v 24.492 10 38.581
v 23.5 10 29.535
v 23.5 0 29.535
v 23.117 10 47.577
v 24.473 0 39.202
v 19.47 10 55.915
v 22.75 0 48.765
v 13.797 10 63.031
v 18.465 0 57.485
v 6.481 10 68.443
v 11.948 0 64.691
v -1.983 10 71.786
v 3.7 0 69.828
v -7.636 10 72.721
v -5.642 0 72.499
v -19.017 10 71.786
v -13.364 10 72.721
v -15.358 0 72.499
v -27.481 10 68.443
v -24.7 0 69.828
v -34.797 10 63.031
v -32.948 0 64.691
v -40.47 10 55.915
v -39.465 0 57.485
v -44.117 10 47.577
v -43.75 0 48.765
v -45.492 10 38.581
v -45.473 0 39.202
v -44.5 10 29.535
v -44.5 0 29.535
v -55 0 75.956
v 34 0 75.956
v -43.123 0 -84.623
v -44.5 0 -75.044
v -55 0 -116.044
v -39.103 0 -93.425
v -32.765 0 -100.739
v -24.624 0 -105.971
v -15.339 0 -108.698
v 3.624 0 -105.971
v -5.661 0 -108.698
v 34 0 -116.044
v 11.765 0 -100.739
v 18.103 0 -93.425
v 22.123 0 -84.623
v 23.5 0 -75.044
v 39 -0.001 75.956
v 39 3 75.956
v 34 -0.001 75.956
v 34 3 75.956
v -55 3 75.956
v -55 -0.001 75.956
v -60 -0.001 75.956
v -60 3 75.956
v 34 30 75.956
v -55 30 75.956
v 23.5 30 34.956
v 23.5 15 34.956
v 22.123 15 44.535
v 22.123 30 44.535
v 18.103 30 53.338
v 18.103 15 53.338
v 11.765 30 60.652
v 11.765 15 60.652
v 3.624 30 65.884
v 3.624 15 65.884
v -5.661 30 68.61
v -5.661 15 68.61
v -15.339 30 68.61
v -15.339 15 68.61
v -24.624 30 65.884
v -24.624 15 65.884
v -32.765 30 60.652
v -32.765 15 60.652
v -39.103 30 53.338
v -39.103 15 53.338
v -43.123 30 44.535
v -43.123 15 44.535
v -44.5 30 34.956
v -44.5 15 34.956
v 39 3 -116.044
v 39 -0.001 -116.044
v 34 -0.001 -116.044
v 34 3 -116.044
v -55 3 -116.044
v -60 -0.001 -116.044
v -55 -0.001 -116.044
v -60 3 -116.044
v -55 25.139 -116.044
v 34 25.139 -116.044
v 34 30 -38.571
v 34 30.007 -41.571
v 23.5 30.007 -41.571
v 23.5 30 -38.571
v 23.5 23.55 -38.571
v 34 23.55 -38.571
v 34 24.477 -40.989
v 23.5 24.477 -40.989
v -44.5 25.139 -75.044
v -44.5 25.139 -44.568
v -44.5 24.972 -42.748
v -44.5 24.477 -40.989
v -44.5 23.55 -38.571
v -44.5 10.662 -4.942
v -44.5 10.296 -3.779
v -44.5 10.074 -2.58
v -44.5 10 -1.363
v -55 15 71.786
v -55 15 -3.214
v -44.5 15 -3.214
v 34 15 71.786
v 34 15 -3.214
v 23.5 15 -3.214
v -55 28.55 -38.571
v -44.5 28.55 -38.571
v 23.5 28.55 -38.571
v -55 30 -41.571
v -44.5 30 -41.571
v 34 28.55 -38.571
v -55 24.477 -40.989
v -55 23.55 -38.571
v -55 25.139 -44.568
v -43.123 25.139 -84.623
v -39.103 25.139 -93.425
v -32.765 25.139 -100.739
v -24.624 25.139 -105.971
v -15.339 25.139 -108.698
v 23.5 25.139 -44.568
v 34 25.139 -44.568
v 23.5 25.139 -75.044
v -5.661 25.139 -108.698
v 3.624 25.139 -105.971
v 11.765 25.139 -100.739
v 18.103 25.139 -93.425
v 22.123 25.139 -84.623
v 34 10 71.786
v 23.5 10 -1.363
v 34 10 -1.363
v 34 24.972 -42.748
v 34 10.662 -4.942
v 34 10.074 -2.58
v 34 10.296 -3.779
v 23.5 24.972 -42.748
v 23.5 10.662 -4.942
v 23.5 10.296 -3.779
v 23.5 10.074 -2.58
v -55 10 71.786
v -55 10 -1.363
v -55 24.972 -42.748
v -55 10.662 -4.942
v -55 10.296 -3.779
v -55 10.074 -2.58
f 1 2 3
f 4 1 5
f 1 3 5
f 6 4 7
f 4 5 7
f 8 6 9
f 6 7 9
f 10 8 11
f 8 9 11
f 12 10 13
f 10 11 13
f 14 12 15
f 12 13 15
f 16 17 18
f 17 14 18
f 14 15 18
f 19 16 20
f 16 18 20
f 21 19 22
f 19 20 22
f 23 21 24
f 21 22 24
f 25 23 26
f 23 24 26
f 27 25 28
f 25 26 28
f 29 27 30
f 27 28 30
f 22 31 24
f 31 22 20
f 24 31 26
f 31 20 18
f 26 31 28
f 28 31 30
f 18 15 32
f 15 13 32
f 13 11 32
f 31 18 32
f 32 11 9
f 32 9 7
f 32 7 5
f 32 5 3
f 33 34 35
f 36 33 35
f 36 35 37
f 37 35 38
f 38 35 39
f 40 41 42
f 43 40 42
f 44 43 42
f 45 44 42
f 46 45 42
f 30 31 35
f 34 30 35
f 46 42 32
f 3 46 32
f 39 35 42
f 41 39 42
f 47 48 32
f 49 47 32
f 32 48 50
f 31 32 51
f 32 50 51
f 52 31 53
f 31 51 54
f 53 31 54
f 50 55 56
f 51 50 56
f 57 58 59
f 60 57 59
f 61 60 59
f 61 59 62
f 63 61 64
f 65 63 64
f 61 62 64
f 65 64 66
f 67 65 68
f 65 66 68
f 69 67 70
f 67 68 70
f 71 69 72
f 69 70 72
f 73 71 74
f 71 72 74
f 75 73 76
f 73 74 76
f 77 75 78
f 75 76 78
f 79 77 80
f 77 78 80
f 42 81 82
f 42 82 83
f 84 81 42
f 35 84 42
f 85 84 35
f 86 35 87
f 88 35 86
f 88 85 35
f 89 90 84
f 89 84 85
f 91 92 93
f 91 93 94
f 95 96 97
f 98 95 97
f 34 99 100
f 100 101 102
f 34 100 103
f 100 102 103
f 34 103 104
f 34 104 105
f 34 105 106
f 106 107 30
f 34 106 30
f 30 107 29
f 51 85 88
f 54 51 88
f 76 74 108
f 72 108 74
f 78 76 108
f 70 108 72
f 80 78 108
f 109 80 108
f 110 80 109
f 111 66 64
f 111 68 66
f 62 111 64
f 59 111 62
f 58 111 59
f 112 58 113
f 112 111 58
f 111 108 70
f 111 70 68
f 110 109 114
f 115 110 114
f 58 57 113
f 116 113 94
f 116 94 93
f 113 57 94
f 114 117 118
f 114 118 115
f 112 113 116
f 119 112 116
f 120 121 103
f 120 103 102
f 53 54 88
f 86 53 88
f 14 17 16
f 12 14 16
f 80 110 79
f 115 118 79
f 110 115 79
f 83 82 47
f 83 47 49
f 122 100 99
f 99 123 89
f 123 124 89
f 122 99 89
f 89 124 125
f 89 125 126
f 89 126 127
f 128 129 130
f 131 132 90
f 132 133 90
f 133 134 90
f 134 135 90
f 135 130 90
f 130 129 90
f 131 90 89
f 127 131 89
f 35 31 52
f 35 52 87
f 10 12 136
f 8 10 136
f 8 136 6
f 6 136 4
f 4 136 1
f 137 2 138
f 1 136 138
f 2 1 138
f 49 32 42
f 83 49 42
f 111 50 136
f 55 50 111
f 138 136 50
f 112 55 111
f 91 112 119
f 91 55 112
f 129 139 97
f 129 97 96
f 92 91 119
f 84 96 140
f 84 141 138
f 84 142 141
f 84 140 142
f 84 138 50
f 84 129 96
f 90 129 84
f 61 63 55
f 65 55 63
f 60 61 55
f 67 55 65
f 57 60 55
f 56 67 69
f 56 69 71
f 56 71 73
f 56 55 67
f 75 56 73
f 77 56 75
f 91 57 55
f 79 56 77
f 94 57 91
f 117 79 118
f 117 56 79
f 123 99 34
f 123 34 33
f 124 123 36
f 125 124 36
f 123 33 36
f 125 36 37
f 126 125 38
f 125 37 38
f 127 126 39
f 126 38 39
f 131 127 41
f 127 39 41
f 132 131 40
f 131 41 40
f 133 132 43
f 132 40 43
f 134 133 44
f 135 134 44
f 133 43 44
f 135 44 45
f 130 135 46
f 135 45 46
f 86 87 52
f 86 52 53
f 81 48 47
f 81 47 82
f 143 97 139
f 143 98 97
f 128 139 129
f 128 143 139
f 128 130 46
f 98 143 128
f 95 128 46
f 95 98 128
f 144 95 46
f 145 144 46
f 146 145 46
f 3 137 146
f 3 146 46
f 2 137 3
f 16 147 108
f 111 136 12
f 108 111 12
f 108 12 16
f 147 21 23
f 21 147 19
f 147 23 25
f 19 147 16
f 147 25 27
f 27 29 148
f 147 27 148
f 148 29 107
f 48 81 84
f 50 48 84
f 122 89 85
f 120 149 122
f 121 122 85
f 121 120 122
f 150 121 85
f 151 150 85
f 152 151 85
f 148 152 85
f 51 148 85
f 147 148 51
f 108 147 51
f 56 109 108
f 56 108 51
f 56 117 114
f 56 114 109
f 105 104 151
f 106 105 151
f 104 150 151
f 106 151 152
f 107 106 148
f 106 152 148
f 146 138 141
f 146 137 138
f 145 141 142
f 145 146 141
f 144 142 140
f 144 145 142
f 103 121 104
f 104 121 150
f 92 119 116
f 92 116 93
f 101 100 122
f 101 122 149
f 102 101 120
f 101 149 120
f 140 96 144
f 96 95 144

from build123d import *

# Parameters (mm, degrees)
SKETCH1_W                = 89
SKETCH1_H                = 192
BOSS_EXTRUDE1_DEPTH      = 30
SKETCH2_R                = 34.99943994
CUT_EXTRUDE1_DEPTH       = 10
SKETCH3_W                = 75
SKETCH3_H                = 5
CUT_EXTRUDE2_DEPTH       = 102
CUT_EXTRUDE4_DEPTH       = 102
SKETCH6_W                = 10.5
SKETCH6_H                = 4
CUT_EXTRUDE7_DEPTH       = 8
BOSS_EXTRUDE2_DEPTH      = 10.5
CUT_EXTRUDE8_DEPTH       = 20.767757578
BOSS_EXTRUDE3_DEPTH      = 10.5
CUT_EXTRUDE9_DEPTH       = 22.812544275
BOSS_EXTRUDE6_DEPTH      = 10.5
BOSS_EXTRUDE7_DEPTH      = 10.5
FILLET1_R                = 10
FILLET2_R                = 10
FILLET3_R                = 10
FILLET4_R                = 10
CUT_EXTRUDE11_DEPTH      = 99
SKETCH15_W               = 7.554212703
SKETCH15_H               = 3.259234926
CUT_EXTRUDE12_DEPTH      = 99
FILLET5_R                = 10
BOSS_EXTRUDE8_DEPTH      = 0.001
BOSS_EXTRUDE8_DEPTH_BACK = 3
SKETCH16_W               = 5
SKETCH16_H               = 192


with BuildPart() as part:
    # Sketch1 → Boss-Extrude1 (new body)
    with BuildSketch(Plane(origin=(0, 0, 0), x_dir=(1, 0, 0), z_dir=(0, 1, 0))):
        with Locations((-10.5, 20.043668932)):
            Rectangle(SKETCH1_W, SKETCH1_H)
        with BuildLine():
            Line((-44.5, -34.956331068), (-44.5, 75.043668932))
            ThreePointArc((-44.5, 75.043668932), (-10.5, 109.043668932), (23.5, 75.043668932))
            Line((23.5, 75.043668932), (23.5, -34.956331068))
            ThreePointArc((23.5, -34.956331068), (-10.5, -68.956331068), (-44.5, -34.956331068))
        make_face(mode=Mode.SUBTRACT)
    extrude(amount=BOSS_EXTRUDE1_DEPTH)

    # Sketch2 → Cut-Extrude1 (cut)
    with BuildSketch(Plane.XZ):
        with Locations((-10.5, 37.838844027)):
            Circle(SKETCH2_R)
    extrude(amount=-CUT_EXTRUDE1_DEPTH, mode=Mode.SUBTRACT)

    # Sketch3 → Cut-Extrude2 (cut)
    with BuildSketch(Plane(origin=(34, 0, 0), x_dir=(0, 0, -1), z_dir=(1, 0, 0))):
        with Locations((-34.286288065, 12.5)):
            Rectangle(SKETCH3_W, SKETCH3_H)
    extrude(amount=-CUT_EXTRUDE2_DEPTH, mode=Mode.SUBTRACT)

    # Sketch4 → Cut-Extrude4 (cut)
    with BuildSketch(Plane.ZY.offset(55)):
        Polygon((-40.970715348, 29.469395922), (-41.211628541, 24.561719678), (-3.213711935, 10), (-3.213711935, 15), align=None)
    extrude(amount=-CUT_EXTRUDE4_DEPTH, mode=Mode.SUBTRACT)

    # Sketch6 → Cut-Extrude7 (cut)
    with BuildSketch(Plane(origin=(0, 30, 0), x_dir=(1, 0, 0), z_dir=(0, 1, 0))):
        with Locations((-49.75, 40.570603007)):
            Rectangle(SKETCH6_W, SKETCH6_H)
        with Locations((28.75, 40.570603007)):
            Rectangle(SKETCH6_W, SKETCH6_H)
    extrude(amount=-CUT_EXTRUDE7_DEPTH, mode=Mode.SUBTRACT)

    # Sketch7 → Boss-Extrude2 (add)
    with BuildSketch(Plane.ZY.offset(55)):
        Polygon((-38.570603007, 23.549614886), (-42.570603007, 25.082511526), (-42.570603007, 22), (-38.570603007, 22), align=None)
    extrude(amount=-BOSS_EXTRUDE2_DEPTH)

    # Sketch8 → Cut-Extrude8 (cut)
    with BuildSketch(Plane.ZY.offset(55)):
        Polygon((-42.570603007, 25.082511526), (-55.402488324, 30), (-42.570603007, 30), align=None)
    extrude(amount=-CUT_EXTRUDE8_DEPTH, mode=Mode.SUBTRACT)

    # Sketch9 → Boss-Extrude3 (add)
    with BuildSketch(Plane(origin=(34, 0, 0), x_dir=(0, 0, -1), z_dir=(1, 0, 0))):
        Polygon((38.570603007, 23.549614886), (42.570603007, 25.082511526), (42.570603007, 22), (38.570603007, 22), align=None)
    extrude(amount=-BOSS_EXTRUDE3_DEPTH)

    # Sketch10 → Cut-Extrude9 (cut)
    with BuildSketch(Plane(origin=(34, 0, 0), x_dir=(0, 0, -1), z_dir=(1, 0, 0))):
        Polygon((42.570603007, 25.082511526), (55.402488324, 30), (42.570603007, 30), align=None)
    extrude(amount=-CUT_EXTRUDE9_DEPTH, mode=Mode.SUBTRACT)

    # Sketch12 → Boss-Extrude6 (add)
    with BuildSketch(Plane.ZY.offset(55)):
        Polygon((-38.570603007, 30), (-41.570603007, 30), (-38.570603007, 28.549614886), align=None)
    extrude(amount=-BOSS_EXTRUDE6_DEPTH)

    # Sketch11 → Boss-Extrude7 (add)
    with BuildSketch(Plane(origin=(34, 0, 0), x_dir=(0, 0, -1), z_dir=(1, 0, 0))):
        Polygon((38.570603007, 28.549614886), (41.570603007, 30.007074027), (38.570603007, 30), align=None)
    extrude(amount=-BOSS_EXTRUDE7_DEPTH)

    # Fillet1
    fillet1_edges = [part.edges().sort_by_distance(p)[0] for p in [
        (-49.75, 30, -55.402488324),
    ]]
    fillet(fillet1_edges, radius=FILLET1_R)

    # Fillet2
    fillet2_edges = [part.edges().sort_by_distance(p)[0] for p in [
        (28.75, 30, -55.402488324),
    ]]
    fillet(fillet2_edges, radius=FILLET2_R)

    # Fillet3
    fillet3_edges = [part.edges().sort_by_distance(p)[0] for p in [
        (-49.75, 10, -3.213711935),
    ]]
    fillet(fillet3_edges, radius=FILLET3_R)

    # Fillet4
    fillet4_edges = [part.edges().sort_by_distance(p)[0] for p in [
        (28.75, 10, -3.213711935),
    ]]
    fillet(fillet4_edges, radius=FILLET4_R)

    # Sketch14 → Cut-Extrude11 (cut)
    with BuildSketch(Plane(origin=(34, 0, 0), x_dir=(0, 0, -1), z_dir=(1, 0, 0))):
        Polygon((42.717415751, 25.138773717), (116.043668932, 25.138773717), (116.043668932, 30), (57.252994033, 30), (53.674522762, 29.337801849), align=None)
    extrude(amount=-CUT_EXTRUDE11_DEPTH, mode=Mode.SUBTRACT)


with BuildPart() as cut_extrude11_piece_1:
    # of the separate pieces the step leaves, piece 1, a body of its own (cut_extrude11_pieces)
    add(part.part.solids().sort_by_distance((23.5, 25.138773717, -42.717415751))[0])

    # Fillet5
    fillet5_edges = [cut_extrude11_piece_1.edges().sort_by_distance(p)[0] for p in [
        (-49.75, 25.138773717, -42.717415751),
        (28.75, 25.138773717, -42.717415751),
    ]]
    fillet(fillet5_edges, radius=FILLET5_R)

    # Sketch16 → Boss-Extrude8 (add, two sides: drawn at the far end of the back side and taken through both)
    with BuildSketch(Plane(origin=(0, 0, 0), x_dir=(-1, 0, 0), z_dir=(0, -1, 0)).offset(-BOSS_EXTRUDE8_DEPTH_BACK)):
        with Locations((-36.5, 20.043668932)):
            Rectangle(SKETCH16_W, SKETCH16_H)
        with Locations((57.5, 20.043668932)):
            Rectangle(SKETCH16_W, SKETCH16_H)
    extrude(amount=BOSS_EXTRUDE8_DEPTH + BOSS_EXTRUDE8_DEPTH_BACK)


with BuildPart() as cut_extrude11_piece_2:
    # of the separate pieces the step leaves, piece 2, a body of its own (cut_extrude11_pieces)
    add(part.part.solids().sort_by_distance((23.5, 30, -57.252994033))[0])


with BuildPart() as cut_extrude11_piece_3:
    # of the separate pieces the step leaves, piece 3, a body of its own (cut_extrude11_pieces)
    add(part.part.solids().sort_by_distance((-55, 30, -57.252994033))[0])


with BuildPart() as cut_extrude12_tool:
    # Sketch15 → Cut-Extrude12 (new body)
    with BuildSketch(Plane(origin=(34, 0, 0), x_dir=(0, 0, -1), z_dir=(1, 0, 0))):
        with Locations((54.846987071, 29.864387296)):
            Rectangle(SKETCH15_W, SKETCH15_H)
    extrude(amount=-CUT_EXTRUDE12_DEPTH)


with BuildPart() as cut_extrude11_piece_2_1:
    add(cut_extrude11_piece_2.part)

    # Cut-Extrude12: cut by cut_extrude12_tool
    add(cut_extrude12_tool.part, mode=Mode.SUBTRACT)


with BuildPart() as cut_extrude11_piece_3_1:
    add(cut_extrude11_piece_3.part)

    # Cut-Extrude12: cut by cut_extrude12_tool
    add(cut_extrude12_tool.part, mode=Mode.SUBTRACT)


solid = cut_extrude11_piece_1.part
